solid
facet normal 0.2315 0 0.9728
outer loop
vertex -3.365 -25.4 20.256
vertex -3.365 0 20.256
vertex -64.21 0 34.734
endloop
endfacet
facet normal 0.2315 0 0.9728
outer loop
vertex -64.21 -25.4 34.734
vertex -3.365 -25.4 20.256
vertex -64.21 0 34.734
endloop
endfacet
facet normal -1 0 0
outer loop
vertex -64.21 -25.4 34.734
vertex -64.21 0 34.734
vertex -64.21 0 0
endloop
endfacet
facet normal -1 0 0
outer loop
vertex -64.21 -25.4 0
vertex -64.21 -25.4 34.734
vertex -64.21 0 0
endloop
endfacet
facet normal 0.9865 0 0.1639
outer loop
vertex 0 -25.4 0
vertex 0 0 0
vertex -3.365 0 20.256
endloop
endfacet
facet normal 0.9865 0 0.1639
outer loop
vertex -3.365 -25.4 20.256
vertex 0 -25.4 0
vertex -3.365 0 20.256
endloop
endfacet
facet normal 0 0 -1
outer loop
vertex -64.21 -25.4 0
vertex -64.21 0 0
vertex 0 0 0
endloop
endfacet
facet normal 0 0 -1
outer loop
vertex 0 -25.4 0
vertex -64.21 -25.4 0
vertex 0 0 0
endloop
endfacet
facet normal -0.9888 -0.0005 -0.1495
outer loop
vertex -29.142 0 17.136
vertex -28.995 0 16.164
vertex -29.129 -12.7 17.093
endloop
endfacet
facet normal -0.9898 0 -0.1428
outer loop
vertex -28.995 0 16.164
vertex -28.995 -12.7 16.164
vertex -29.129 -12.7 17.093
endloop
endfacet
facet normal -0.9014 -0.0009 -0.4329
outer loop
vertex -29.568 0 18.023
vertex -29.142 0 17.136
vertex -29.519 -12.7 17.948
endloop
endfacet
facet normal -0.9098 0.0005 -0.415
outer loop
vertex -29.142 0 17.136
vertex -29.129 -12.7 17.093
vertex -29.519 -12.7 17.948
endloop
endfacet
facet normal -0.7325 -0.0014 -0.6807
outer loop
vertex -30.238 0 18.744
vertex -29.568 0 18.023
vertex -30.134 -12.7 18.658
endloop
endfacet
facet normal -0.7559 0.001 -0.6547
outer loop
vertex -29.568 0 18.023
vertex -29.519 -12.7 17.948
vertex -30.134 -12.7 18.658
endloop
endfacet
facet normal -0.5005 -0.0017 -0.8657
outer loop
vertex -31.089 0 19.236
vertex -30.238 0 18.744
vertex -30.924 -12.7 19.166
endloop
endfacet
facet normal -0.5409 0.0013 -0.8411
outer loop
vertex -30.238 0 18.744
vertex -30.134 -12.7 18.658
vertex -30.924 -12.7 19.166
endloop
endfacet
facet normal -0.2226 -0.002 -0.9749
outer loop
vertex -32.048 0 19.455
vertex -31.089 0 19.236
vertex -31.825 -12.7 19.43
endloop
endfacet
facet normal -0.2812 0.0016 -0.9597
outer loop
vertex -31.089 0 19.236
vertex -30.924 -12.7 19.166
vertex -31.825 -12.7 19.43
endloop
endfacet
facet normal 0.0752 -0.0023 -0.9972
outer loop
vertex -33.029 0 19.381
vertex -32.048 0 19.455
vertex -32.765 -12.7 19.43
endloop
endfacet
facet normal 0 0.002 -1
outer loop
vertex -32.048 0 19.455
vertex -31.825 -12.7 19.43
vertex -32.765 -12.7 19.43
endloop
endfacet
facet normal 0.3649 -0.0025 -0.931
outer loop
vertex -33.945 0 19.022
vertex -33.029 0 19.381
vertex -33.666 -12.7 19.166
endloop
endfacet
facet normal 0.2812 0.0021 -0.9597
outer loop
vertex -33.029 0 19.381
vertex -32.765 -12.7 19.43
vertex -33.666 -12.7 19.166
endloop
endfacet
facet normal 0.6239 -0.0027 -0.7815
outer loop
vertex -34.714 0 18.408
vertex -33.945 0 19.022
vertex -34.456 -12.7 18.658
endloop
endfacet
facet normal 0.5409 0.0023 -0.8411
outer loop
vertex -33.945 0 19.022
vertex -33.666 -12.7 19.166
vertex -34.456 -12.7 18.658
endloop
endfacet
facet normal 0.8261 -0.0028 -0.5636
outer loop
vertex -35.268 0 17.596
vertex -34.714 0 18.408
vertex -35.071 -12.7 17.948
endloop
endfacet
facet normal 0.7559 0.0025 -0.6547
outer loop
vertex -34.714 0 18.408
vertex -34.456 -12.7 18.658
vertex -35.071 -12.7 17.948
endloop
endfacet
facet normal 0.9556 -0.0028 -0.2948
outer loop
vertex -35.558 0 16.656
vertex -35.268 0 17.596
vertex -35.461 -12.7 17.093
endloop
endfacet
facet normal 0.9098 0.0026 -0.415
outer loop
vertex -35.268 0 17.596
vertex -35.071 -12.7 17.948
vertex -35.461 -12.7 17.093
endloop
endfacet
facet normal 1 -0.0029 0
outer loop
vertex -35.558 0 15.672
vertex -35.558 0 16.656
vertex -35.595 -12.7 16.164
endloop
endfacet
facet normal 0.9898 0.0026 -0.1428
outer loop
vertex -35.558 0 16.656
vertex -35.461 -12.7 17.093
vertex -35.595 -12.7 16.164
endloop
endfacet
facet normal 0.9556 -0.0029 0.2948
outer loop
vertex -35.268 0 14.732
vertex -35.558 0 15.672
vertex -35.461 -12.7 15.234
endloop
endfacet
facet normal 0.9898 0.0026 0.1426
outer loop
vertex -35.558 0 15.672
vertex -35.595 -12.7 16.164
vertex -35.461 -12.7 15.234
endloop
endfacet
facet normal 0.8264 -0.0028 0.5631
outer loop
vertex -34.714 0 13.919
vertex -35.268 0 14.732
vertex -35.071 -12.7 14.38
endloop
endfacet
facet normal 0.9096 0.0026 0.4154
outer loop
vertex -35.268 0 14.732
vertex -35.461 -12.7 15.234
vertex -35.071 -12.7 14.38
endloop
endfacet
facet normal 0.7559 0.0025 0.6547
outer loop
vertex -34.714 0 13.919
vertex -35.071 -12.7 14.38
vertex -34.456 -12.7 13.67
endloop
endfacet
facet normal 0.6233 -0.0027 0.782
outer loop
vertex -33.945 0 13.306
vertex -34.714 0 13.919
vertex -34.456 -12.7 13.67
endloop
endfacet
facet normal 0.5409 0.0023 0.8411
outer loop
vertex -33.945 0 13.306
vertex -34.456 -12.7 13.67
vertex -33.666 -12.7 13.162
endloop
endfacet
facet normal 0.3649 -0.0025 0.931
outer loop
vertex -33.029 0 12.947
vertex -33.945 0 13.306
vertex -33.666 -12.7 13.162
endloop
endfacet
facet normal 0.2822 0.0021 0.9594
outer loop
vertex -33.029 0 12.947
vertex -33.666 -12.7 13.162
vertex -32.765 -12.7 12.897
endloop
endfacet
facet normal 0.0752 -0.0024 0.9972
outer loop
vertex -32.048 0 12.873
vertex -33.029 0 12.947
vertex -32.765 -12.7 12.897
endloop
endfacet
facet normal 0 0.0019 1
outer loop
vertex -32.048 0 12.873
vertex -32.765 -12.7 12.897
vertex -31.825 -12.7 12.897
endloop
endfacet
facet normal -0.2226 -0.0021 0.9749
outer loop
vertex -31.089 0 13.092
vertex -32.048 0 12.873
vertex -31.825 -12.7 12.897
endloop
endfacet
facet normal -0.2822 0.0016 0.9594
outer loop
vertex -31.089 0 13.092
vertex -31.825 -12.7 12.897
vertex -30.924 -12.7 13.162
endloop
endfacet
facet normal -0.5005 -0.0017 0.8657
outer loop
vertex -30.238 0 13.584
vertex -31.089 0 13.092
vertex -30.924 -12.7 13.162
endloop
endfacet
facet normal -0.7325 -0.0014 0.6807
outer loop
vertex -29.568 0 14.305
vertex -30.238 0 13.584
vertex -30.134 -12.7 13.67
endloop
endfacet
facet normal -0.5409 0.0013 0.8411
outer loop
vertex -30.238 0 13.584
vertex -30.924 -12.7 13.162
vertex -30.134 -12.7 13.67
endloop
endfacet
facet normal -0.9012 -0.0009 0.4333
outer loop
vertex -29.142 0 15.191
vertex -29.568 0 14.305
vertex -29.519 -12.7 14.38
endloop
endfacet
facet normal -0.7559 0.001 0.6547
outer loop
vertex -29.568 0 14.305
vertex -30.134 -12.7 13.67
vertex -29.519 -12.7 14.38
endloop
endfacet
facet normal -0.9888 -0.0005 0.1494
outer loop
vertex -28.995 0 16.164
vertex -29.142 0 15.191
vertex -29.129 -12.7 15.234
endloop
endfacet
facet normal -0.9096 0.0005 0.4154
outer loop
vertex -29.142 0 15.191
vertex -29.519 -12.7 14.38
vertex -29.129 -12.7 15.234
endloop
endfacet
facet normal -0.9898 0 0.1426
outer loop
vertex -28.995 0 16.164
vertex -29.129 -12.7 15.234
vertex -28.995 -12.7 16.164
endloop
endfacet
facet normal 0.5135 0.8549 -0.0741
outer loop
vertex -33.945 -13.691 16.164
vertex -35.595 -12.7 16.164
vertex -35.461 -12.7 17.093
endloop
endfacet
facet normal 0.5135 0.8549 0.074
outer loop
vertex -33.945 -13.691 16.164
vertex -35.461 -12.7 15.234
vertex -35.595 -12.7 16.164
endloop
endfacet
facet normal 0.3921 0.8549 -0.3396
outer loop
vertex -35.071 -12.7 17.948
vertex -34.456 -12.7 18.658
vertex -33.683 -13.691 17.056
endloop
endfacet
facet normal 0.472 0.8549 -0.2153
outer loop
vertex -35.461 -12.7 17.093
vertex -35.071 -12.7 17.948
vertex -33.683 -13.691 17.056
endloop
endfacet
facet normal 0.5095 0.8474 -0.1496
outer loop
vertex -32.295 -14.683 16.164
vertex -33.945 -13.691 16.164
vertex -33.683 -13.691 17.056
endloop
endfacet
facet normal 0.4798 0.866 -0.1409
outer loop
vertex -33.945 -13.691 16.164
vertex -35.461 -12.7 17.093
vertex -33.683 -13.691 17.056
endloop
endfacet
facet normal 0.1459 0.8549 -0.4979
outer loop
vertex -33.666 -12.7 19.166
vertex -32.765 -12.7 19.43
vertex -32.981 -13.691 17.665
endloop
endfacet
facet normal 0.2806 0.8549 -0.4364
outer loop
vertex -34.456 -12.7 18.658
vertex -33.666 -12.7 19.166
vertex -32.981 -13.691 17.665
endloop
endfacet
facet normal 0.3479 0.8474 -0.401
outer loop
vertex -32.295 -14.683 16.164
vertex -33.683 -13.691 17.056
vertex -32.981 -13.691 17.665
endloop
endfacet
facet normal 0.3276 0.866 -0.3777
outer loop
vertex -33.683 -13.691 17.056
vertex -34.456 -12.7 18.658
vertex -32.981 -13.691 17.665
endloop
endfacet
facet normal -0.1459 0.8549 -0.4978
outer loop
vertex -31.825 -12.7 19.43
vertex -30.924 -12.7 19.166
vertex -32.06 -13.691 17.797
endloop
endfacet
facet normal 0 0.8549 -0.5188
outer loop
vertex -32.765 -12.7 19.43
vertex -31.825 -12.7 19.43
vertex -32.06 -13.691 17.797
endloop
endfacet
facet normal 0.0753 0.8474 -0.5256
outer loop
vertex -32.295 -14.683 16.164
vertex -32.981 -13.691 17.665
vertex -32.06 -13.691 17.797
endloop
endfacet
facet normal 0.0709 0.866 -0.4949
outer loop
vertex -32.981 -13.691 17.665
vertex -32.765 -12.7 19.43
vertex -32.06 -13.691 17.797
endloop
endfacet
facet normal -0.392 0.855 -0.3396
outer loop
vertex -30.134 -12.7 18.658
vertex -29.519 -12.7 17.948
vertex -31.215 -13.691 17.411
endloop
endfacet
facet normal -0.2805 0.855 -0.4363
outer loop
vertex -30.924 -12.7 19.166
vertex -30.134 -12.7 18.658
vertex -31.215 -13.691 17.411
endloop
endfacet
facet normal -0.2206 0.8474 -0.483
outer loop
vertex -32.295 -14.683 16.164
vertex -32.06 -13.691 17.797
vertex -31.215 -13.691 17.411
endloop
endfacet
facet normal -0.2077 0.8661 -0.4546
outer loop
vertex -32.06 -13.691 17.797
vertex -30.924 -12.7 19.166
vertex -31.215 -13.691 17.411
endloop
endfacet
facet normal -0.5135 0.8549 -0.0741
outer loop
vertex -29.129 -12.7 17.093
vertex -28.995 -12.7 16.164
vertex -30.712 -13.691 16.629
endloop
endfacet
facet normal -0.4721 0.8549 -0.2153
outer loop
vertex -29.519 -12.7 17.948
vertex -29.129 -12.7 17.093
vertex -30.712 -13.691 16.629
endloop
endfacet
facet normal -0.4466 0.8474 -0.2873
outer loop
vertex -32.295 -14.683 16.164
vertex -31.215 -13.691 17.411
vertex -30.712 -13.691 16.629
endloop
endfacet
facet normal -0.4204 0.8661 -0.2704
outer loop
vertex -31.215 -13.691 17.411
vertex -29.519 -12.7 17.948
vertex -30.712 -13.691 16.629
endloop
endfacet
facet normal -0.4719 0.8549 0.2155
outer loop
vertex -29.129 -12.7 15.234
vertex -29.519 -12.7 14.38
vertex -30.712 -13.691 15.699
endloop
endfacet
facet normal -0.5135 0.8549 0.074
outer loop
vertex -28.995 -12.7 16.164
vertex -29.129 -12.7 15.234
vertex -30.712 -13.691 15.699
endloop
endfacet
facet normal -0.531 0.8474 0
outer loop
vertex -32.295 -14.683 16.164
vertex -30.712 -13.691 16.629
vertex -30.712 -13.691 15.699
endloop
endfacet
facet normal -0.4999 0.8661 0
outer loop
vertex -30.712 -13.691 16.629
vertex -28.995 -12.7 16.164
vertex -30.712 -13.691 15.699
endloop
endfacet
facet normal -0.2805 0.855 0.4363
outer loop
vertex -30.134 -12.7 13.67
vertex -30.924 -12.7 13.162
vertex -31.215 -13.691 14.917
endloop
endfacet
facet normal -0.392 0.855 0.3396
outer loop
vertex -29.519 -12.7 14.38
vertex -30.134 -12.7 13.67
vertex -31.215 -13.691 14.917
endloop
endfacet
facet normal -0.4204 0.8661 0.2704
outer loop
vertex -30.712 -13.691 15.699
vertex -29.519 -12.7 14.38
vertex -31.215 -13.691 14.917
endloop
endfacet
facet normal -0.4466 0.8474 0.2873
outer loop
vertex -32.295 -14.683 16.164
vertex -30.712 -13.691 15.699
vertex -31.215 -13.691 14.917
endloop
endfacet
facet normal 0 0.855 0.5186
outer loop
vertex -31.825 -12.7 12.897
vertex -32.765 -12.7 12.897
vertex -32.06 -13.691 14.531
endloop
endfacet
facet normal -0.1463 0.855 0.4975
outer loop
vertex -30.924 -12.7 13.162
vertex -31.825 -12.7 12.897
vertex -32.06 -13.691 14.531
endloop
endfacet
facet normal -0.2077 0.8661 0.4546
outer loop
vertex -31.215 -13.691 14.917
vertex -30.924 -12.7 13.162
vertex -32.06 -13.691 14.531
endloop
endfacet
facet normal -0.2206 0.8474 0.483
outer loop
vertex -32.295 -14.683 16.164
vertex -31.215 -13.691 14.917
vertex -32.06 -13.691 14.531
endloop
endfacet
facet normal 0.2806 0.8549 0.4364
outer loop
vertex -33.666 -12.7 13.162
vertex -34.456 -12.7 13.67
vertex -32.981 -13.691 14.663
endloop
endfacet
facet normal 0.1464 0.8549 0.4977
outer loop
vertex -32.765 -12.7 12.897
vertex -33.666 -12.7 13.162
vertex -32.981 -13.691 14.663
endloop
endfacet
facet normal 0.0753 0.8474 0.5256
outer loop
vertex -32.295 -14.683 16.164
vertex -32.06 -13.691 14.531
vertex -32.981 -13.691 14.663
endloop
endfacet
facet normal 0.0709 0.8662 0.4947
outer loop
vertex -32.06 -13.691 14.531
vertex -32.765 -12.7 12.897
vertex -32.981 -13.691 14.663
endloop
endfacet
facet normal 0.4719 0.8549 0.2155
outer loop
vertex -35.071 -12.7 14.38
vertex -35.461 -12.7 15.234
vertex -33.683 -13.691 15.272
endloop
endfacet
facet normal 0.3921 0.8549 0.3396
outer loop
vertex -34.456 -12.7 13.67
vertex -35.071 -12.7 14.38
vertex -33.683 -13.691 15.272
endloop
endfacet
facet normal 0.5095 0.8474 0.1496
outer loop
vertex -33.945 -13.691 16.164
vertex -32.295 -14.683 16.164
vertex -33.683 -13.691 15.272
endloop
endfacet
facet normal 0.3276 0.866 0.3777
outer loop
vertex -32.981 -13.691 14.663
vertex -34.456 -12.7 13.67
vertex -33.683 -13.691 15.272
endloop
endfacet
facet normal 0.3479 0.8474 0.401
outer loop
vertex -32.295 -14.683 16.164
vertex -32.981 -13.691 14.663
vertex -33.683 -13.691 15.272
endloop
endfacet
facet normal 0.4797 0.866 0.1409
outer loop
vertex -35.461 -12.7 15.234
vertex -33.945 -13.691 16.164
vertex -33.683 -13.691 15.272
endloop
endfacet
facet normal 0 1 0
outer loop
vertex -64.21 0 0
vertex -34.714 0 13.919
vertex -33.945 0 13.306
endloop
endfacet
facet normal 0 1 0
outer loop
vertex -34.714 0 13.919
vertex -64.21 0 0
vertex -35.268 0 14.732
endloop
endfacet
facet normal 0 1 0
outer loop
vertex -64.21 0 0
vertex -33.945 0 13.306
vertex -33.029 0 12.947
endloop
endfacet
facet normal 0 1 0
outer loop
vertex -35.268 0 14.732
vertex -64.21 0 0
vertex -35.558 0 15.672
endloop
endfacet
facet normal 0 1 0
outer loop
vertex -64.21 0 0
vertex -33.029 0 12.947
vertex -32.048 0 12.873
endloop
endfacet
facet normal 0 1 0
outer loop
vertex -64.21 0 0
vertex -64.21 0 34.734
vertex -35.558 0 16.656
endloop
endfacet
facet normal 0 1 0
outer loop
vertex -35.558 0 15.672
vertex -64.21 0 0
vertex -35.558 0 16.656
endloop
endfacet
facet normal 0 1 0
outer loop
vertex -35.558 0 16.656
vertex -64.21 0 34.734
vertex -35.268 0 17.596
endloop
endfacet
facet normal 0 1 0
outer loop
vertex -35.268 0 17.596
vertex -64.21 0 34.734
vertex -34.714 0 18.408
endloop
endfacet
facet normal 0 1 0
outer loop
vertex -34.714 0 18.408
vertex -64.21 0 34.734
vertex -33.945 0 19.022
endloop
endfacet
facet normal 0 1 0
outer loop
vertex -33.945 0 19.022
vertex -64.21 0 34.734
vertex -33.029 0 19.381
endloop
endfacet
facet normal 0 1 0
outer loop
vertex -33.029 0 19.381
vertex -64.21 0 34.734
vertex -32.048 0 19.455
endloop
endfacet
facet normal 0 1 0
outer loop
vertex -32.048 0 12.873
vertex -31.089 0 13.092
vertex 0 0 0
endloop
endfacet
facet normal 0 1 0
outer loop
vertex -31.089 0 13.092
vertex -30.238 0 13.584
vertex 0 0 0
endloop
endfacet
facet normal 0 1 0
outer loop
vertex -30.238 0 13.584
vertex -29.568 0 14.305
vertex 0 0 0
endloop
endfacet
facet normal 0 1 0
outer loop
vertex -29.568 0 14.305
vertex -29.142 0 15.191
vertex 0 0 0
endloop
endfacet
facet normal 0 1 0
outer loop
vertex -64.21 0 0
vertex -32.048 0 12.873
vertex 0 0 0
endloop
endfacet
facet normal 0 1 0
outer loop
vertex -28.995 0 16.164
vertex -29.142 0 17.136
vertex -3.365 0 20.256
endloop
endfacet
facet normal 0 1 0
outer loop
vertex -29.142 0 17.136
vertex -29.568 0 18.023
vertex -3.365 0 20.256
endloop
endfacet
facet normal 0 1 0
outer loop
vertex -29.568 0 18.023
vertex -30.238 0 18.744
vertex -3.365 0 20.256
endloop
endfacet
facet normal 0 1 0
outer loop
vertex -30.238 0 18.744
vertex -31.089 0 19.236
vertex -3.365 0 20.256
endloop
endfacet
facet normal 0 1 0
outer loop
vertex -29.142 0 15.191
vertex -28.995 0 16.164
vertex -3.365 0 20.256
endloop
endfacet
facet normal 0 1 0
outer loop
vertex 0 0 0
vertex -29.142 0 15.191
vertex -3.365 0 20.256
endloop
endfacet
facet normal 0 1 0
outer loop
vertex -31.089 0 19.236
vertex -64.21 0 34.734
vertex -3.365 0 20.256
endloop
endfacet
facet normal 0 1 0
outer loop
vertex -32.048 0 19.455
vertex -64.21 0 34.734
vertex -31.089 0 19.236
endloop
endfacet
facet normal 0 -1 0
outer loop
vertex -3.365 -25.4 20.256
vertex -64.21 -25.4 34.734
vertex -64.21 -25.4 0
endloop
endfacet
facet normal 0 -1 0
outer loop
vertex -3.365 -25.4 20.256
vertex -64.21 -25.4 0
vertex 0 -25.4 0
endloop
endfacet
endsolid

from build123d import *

# Parameters (mm, degrees)
F1_DEPTH = 25.4
F3_D     = 6.6
F3_DEPTH = 12.7
F3_TIP   = 1.9828400428


with BuildPart() as f1:
    # F0 (on Front) → F1 (new body)
    with BuildSketch(Plane.XZ):
        Polygon((-3.3652072307, 20.2556531876), (-64.2102658749, 34.7338579595), (-64.2102658749, 0), (0, 0), align=None)
    extrude(amount=F1_DEPTH)

    # F3
    with Locations(Plane(origin=(0, 0, 0), x_dir=(-1, 0, 0), z_dir=(0, 1, 0))):
        with Locations((32.2950705886, 16.1637682468)):
            Hole(F3_D / 2, depth=F3_DEPTH)
            with Locations((0, 0, -(F3_DEPTH + F3_TIP / 2))):  # 118° drill point
                Cone(0, F3_D / 2, F3_TIP, mode=Mode.SUBTRACT)


solid = f1.part
